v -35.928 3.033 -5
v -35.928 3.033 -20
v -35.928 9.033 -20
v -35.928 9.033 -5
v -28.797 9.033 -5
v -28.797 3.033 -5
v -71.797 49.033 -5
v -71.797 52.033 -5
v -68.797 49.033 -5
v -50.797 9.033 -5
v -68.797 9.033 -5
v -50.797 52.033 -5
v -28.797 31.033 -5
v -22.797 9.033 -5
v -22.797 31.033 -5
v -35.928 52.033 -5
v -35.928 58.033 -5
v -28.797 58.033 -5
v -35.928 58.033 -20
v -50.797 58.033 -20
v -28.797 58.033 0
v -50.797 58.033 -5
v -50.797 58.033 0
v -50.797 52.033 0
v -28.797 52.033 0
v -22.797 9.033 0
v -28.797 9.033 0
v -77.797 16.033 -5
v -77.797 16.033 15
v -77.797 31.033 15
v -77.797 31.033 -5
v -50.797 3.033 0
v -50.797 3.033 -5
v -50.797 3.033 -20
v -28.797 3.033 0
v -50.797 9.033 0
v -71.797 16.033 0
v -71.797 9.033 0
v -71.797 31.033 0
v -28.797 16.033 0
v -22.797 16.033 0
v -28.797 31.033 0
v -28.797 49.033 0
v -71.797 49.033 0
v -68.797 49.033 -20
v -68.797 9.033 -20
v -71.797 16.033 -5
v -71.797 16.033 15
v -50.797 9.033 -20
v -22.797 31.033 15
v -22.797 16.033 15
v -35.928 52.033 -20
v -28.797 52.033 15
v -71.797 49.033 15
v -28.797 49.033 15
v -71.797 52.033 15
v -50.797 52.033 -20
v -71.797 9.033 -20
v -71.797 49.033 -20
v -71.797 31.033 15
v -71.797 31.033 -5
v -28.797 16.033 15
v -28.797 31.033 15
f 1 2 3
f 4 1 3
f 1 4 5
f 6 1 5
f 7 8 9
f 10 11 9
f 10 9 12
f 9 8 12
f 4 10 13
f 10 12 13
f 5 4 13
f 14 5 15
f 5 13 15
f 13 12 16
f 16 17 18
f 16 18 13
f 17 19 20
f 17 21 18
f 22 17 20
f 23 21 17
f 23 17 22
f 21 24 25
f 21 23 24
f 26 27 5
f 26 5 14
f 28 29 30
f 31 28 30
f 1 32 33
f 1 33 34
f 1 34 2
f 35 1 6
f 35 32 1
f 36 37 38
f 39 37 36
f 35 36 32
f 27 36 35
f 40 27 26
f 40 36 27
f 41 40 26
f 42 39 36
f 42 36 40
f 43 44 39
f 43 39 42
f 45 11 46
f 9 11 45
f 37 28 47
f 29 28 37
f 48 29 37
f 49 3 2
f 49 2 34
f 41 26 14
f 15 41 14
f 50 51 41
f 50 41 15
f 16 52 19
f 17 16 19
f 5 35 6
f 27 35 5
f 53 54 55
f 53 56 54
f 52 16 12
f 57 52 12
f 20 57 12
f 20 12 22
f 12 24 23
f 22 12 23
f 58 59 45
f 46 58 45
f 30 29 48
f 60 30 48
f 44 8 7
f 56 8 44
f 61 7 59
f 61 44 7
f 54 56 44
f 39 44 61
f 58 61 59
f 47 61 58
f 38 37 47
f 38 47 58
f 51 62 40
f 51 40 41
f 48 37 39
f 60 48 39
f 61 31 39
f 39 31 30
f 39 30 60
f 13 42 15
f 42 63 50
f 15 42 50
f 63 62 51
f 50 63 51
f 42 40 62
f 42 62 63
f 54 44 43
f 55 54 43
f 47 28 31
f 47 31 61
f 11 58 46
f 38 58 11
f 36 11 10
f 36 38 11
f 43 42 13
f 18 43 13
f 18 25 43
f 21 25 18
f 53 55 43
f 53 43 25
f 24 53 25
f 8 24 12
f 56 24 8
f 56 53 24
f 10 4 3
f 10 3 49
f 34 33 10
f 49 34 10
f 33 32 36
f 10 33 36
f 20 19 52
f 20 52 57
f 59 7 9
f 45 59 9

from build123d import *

# Parameters (mm, degrees)
SKETCH_1_W        = 6
SKETCH_1_H        = 15
EXTRUDE_3_DEPTH   = 15
SKETCH_1_7_W      = 6
SKETCH_1_7_H      = 15
EXTRUDE_3_2_DEPTH = 15
EXTRUDE_4_DEPTH   = 15
EXTRUDE_5_DEPTH   = 5
SKETCH_1_13_W     = 3
SKETCH_1_13_H     = 40
EXTRUDE_10_DEPTH  = 20
SKETCH_3_W        = 14.869090603
SKETCH_3_H        = 6
EXTRUDE_15_DEPTH  = 15


with BuildPart() as part:
    # 草图1 → Extrude 3 (new body)
    with BuildSketch(Plane.XY):
        with Locations((-25.796959303, 23.532605762)):
            Rectangle(SKETCH_1_W, SKETCH_1_H)
    extrude(amount=EXTRUDE_3_DEPTH)



with BuildPart() as body_2:
    # 草图1<7> → Extrude 3 2 (new body)
    with BuildSketch(Plane.XY):
        with Locations((-74.796959303, 23.532605762)):
            Rectangle(SKETCH_1_7_W, SKETCH_1_7_H)
    extrude(amount=EXTRUDE_3_2_DEPTH)


with BuildPart() as body_3:
    # 草图1<8> → 凸台-拉伸4 (new body)
    with BuildSketch(Plane.XY):
        Polygon((-71.796959303, 49.032605762), (-68.796959303, 49.032605762), (-50.796959303, 49.032605762), (-28.796959303, 49.032605762), (-28.796959303, 52.032605762), (-35.796959303, 52.032605762), (-50.796959303, 52.032605762), (-71.796959303, 52.032605762), align=None)
    extrude(amount=EXTRUDE_4_DEPTH)


with BuildPart() as part_1:
    add(part.part)

    add(body_2.part)  # 凸台-拉伸5 merges body 2

    add(body_3.part)  # 凸台-拉伸5 merges body 3
    # 草图1<11> → 凸台-拉伸5 (add)
    with BuildSketch(Plane.XY):
        Polygon((-50.796959303, 3.032605762), (-28.796959303, 3.032605762), (-28.796959303, 9.032605762), (-22.796959303, 9.032605762), (-22.796959303, 31.032605762), (-28.796959303, 31.032605762), (-28.796959303, 58.032605762), (-50.796959303, 58.032605762), (-50.796959303, 52.032605762), (-71.796959303, 52.032605762), (-71.796959303, 31.032605762), (-77.796959303, 31.032605762), (-77.796959303, 16.032605762), (-71.796959303, 16.032605762), (-71.796959303, 9.032605762), (-50.796959303, 9.032605762), align=None)
    extrude(amount=-EXTRUDE_5_DEPTH)

    # 草图1<13> → 凸台-拉伸10 (add)
    with BuildSketch(Plane.XY):
        with Locations((-70.296959303, 29.032605762)):
            Rectangle(SKETCH_1_13_W, SKETCH_1_13_H)
    extrude(amount=-EXTRUDE_10_DEPTH)

    # 草图3 → 凸台-拉伸15 (add)
    with BuildSketch(Plane(origin=(0, 0, -5), x_dir=(-1, 0, 0), z_dir=(0, 0, -1))):
        with Locations((43.362414001, 55.032605762)):
            Rectangle(SKETCH_3_W, SKETCH_3_H)
        with Locations((43.362414001, 6.032605762)):
            Rectangle(SKETCH_3_W, SKETCH_3_H)
    extrude(amount=EXTRUDE_15_DEPTH)


solid = part_1.part
